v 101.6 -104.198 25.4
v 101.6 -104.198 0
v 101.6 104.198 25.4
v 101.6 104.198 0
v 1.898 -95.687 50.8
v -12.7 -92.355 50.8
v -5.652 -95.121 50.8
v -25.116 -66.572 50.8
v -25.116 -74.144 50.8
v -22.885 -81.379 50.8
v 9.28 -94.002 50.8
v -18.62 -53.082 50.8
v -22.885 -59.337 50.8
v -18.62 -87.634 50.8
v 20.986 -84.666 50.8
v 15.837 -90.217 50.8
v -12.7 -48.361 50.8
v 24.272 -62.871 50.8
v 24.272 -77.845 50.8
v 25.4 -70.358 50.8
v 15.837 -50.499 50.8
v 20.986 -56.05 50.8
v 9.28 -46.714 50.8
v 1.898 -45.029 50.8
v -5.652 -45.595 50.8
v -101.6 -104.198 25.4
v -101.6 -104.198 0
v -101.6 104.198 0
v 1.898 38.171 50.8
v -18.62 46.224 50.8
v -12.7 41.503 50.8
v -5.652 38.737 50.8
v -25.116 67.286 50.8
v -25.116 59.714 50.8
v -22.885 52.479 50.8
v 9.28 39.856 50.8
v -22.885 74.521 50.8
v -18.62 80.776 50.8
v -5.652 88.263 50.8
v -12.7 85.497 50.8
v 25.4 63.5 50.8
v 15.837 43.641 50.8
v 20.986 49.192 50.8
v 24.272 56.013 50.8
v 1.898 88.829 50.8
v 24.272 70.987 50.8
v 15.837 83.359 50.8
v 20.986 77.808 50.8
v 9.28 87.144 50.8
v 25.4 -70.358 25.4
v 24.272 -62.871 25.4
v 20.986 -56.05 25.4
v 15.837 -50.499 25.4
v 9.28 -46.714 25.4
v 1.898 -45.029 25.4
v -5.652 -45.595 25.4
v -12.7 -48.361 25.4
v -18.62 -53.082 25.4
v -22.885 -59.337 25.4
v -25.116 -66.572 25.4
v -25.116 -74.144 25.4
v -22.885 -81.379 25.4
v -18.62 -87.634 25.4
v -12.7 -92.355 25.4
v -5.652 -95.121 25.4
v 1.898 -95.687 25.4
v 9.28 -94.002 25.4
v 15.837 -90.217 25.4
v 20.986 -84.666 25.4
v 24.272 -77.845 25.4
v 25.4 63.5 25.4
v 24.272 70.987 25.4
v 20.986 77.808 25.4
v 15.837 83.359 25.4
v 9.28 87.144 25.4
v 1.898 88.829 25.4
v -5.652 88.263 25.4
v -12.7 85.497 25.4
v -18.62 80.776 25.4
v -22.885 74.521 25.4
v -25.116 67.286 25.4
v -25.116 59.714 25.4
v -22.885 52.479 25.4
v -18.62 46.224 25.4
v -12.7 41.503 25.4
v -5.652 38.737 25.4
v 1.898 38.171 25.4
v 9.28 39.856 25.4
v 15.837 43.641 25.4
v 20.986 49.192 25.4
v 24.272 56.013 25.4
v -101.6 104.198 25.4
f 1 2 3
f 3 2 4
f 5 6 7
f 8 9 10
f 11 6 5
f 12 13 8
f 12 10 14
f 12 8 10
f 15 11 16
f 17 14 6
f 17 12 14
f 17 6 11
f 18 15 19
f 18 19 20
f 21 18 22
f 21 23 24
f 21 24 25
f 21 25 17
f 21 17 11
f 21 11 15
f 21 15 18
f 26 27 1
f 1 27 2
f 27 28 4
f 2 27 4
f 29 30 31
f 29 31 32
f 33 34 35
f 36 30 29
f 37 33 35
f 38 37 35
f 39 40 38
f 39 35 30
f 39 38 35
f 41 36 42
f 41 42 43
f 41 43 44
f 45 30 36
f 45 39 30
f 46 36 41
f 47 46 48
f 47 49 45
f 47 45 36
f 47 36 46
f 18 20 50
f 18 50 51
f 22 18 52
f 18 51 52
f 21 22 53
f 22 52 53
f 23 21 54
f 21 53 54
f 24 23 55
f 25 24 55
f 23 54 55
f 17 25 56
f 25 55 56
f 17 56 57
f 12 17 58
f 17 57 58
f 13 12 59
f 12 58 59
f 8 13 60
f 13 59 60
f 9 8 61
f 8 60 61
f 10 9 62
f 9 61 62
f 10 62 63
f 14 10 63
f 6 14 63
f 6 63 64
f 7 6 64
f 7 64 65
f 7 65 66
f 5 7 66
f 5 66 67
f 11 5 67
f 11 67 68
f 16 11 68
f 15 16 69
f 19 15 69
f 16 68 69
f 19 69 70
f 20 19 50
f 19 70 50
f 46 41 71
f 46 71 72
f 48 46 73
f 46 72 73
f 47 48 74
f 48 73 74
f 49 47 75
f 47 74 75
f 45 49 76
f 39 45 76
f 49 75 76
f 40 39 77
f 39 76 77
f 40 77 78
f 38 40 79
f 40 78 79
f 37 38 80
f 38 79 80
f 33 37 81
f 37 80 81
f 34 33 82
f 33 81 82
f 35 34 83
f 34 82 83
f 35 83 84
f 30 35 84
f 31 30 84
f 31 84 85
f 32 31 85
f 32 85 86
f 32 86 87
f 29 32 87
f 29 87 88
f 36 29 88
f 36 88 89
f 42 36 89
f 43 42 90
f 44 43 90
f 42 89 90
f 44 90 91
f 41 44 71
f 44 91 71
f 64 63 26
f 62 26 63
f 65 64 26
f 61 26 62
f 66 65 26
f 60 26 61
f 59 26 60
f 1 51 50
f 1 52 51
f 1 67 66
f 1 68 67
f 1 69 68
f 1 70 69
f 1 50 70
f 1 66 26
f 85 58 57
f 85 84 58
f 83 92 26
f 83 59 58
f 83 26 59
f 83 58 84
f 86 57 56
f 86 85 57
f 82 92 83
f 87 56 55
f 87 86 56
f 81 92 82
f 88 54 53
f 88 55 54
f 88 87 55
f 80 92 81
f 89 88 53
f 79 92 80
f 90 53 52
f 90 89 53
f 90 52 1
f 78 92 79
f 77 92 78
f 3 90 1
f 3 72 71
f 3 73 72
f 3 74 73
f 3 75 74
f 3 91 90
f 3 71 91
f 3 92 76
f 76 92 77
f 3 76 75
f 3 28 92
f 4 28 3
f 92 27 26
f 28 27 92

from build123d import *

# Parameters (mm, degrees)
F0_W     = 203.2
F0_H     = 208.396926
F1_DEPTH = 25.4
F2_R     = 25.4
F3_DEPTH = 25.4
F4_R     = 25.4
F5_DEPTH = 25.4


with BuildPart() as f1:
    # F0 (on Top) → F1 (new body)
    with BuildSketch(Plane.XY):
        Rectangle(F0_W, F0_H)
    extrude(amount=F1_DEPTH)

    # F2 (on face) → F3 (join)
    with BuildSketch(Plane.XY.offset(25.4)):
        with Locations((0, 63.5)):
            Circle(F2_R)
    extrude(amount=F3_DEPTH)

    # F4 (on face) → F5 (join, through all)
    with BuildSketch(Plane.XY.offset(25.4)):
        with Locations((0, -70.358)):
            Circle(F4_R)
    extrude(amount=F5_DEPTH)


solid = f1.part
